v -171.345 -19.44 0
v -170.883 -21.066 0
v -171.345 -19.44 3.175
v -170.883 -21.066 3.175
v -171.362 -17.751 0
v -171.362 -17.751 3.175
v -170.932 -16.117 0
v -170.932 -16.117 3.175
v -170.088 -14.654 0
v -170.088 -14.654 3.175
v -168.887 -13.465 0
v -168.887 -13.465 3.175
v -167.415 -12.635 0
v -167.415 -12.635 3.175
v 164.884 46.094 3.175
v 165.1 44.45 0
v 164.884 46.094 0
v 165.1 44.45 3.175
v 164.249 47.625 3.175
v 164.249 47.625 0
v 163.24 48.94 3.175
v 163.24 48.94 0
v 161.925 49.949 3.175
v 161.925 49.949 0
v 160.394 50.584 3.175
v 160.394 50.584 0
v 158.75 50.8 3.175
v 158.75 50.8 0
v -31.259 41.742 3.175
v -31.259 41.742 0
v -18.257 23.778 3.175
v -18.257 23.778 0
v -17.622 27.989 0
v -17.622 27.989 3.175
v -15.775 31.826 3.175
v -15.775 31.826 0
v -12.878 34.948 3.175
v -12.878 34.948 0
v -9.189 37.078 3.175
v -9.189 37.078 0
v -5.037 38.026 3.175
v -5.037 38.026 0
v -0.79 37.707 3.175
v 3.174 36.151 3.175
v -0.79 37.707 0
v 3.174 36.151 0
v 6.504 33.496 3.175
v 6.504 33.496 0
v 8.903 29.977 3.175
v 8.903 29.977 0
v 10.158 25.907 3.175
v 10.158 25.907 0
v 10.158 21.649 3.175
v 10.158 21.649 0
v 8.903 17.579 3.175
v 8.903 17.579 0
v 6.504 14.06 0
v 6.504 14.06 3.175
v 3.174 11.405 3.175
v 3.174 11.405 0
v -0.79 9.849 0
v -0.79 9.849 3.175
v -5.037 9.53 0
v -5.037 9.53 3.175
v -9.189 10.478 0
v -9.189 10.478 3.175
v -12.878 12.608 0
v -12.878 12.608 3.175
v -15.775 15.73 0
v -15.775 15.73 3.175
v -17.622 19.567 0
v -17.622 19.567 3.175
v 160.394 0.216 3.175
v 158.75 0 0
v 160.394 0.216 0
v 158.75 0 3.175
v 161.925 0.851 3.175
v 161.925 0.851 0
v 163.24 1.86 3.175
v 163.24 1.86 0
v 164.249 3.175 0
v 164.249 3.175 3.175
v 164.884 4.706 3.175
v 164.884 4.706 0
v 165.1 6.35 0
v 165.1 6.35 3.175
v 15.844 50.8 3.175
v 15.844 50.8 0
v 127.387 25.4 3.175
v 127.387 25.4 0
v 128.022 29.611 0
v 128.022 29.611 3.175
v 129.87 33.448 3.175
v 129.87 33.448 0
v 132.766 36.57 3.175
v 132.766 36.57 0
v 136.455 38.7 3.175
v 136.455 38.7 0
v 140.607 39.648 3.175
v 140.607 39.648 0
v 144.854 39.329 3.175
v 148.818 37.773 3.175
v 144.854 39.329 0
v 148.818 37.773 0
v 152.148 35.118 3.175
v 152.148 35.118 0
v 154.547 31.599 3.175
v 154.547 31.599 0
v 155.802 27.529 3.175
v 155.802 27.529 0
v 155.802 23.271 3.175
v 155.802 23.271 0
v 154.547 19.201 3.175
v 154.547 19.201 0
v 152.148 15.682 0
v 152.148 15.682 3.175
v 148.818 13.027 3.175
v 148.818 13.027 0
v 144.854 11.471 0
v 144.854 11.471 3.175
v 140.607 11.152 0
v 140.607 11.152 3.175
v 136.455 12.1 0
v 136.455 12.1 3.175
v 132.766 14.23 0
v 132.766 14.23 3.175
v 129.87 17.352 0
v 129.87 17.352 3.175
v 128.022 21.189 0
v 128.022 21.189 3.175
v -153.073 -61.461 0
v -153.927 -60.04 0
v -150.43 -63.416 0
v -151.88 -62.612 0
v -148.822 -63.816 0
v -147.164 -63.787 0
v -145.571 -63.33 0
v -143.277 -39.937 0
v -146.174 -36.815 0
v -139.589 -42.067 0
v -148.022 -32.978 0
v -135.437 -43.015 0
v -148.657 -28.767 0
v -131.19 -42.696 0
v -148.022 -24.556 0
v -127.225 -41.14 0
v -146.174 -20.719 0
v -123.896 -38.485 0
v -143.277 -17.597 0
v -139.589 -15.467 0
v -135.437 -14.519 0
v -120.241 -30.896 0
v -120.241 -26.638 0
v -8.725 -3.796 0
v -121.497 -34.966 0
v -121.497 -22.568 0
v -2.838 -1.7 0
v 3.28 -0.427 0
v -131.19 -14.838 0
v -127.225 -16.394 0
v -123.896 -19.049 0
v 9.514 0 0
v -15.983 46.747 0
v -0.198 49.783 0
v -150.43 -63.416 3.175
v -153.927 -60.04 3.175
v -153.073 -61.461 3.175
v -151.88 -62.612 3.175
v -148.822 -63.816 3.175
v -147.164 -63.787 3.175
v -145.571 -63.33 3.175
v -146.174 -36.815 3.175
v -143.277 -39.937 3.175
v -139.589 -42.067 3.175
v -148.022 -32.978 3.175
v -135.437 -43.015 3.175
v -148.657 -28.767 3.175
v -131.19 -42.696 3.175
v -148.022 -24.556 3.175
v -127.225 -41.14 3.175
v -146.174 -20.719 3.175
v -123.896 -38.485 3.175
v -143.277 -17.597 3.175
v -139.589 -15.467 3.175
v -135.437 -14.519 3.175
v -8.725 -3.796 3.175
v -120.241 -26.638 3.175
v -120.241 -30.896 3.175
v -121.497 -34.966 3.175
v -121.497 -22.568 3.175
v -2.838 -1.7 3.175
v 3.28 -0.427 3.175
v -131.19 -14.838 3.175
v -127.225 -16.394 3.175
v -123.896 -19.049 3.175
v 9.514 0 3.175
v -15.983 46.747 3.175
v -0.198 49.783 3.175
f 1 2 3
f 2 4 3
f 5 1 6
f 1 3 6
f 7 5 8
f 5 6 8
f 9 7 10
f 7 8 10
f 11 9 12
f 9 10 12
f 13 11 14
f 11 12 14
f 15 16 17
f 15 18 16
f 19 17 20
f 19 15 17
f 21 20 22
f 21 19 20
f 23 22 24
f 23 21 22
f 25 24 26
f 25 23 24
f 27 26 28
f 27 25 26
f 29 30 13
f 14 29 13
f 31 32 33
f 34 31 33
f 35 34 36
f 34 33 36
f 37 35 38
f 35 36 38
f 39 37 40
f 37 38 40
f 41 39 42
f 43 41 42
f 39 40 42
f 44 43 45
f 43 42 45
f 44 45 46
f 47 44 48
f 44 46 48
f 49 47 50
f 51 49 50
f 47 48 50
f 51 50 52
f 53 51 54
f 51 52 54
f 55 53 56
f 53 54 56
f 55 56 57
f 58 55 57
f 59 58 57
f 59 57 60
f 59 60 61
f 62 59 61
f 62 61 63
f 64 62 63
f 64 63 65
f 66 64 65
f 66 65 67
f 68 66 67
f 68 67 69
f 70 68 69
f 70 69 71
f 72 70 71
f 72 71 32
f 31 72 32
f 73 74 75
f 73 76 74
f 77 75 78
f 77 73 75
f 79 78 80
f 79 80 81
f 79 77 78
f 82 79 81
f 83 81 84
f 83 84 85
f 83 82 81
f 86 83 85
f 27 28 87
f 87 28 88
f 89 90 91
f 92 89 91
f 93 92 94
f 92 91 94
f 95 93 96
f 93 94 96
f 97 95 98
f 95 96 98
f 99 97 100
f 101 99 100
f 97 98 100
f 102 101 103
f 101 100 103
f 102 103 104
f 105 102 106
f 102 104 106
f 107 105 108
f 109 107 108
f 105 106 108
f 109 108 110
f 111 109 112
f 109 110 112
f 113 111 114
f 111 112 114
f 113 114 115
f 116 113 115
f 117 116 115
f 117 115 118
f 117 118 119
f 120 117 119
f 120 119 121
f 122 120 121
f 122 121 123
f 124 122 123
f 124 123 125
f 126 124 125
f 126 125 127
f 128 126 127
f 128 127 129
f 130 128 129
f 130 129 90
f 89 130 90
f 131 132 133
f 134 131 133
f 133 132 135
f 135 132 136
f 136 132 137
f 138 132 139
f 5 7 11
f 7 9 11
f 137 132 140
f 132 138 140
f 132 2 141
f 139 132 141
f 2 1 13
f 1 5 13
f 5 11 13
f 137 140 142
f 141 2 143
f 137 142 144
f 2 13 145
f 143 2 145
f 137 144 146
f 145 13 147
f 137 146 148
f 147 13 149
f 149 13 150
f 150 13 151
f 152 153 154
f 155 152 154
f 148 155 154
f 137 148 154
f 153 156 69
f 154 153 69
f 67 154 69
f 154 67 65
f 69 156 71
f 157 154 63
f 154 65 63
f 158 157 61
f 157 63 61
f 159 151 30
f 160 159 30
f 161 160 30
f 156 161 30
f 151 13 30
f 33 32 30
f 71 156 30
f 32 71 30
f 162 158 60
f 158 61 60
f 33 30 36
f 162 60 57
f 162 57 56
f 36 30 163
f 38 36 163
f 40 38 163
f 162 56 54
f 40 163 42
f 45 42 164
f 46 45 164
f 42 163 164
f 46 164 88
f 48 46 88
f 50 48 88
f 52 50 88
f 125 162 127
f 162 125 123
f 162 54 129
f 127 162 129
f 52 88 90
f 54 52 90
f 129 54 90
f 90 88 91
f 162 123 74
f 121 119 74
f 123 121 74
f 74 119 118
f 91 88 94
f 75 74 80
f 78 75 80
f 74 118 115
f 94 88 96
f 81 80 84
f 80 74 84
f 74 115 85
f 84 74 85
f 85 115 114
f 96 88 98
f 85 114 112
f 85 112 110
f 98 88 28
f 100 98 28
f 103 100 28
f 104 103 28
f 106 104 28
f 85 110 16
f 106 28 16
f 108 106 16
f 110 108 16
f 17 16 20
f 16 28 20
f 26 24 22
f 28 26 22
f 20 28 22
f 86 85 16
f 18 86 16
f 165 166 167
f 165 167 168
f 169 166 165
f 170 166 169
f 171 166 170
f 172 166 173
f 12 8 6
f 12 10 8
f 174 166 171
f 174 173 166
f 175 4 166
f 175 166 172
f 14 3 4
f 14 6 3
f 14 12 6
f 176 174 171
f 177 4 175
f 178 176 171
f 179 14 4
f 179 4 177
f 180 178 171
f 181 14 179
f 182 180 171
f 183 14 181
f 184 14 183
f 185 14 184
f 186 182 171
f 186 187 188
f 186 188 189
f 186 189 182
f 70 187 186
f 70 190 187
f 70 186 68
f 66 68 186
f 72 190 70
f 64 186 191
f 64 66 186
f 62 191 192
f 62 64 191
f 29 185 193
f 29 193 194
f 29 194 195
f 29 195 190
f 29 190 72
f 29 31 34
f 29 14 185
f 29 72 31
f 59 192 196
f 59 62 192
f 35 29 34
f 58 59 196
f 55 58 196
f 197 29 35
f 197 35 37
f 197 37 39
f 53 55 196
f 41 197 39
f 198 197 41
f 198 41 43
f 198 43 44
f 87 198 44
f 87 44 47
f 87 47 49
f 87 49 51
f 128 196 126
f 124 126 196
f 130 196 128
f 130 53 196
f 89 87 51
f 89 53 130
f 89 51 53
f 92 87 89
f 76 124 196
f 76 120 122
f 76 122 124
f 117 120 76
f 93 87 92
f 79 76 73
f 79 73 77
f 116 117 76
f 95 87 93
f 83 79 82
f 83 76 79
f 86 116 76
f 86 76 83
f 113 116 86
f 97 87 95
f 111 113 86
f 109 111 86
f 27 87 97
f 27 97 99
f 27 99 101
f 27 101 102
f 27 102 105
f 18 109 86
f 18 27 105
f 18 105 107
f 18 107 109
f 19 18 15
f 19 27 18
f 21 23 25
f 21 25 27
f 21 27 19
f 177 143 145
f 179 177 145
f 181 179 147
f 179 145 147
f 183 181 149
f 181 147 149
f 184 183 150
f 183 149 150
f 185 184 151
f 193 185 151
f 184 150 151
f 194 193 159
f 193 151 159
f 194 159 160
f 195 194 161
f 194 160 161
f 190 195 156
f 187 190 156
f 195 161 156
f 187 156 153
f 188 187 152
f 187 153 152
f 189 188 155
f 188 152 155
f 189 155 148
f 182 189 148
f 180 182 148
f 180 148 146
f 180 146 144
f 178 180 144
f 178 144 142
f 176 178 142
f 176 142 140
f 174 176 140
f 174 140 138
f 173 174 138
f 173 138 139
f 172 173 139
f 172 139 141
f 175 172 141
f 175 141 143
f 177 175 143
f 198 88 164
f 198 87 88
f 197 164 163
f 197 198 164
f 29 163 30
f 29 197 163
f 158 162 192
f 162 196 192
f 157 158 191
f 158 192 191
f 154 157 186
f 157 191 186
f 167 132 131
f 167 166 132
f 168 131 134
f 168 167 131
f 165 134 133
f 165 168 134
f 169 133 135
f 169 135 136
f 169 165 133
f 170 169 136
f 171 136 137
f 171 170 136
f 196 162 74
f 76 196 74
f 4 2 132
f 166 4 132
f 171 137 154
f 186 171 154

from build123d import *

# Parameters (mm, degrees)
BOSS_EXTRUDE1_DEPTH = 3.175
FILLET1_R           = 45.72
FILLET4_R           = 127
FILLET5_R           = 6.35
FILLET6_R           = 6.35
FILLET7_R           = 6.35
FILLET8_R           = 6.35
SKETCH4_R           = 14.2875
CUT_EXTRUDE1_DEPTH  = 18.415


with BuildPart() as part:
    # Sketch1 → Boss-Extrude1 (new body)
    with BuildSketch(Plane.XY):
        Polygon((0, 0), (165.1, 0), (165.1, 50.8), (-8.578307929, 50.8), (-173.494021533, -15.063128689), (-151.393719418, -65.863128689), align=None)
    extrude(amount=BOSS_EXTRUDE1_DEPTH)

    # Fillet1
    fillet1_edges = [part.edges().sort_by_distance(p)[0] for p in [
        (0, 0, 1.5875),
    ]]
    fillet(fillet1_edges, radius=FILLET1_R)

    # Fillet4
    fillet4_edges = [part.edges().sort_by_distance(p)[0] for p in [
        (-8.578307929, 50.8, 1.5875),
    ]]
    fillet(fillet4_edges, radius=FILLET4_R)

    # Fillet5
    fillet5_edges = [part.edges().sort_by_distance(p)[0] for p in [
        (-151.393719418, -65.863128689, 1.5875),
    ]]
    fillet(fillet5_edges, radius=FILLET5_R)

    # Fillet6
    fillet6_edges = [part.edges().sort_by_distance(p)[0] for p in [
        (-173.494021533, -15.063128689, 1.5875),
    ]]
    fillet(fillet6_edges, radius=FILLET6_R)

    # Fillet7
    fillet7_edges = [part.edges().sort_by_distance(p)[0] for p in [
        (165.1, 0, 1.5875),
    ]]
    fillet(fillet7_edges, radius=FILLET7_R)

    # Fillet8
    fillet8_edges = [part.edges().sort_by_distance(p)[0] for p in [
        (165.1, 50.8, 1.5875),
    ]]
    fillet(fillet8_edges, radius=FILLET8_R)

    # Sketch4 → Cut-Extrude1 (cut)
    with BuildSketch(Plane(origin=(0, 0, 0), x_dir=(-1, 0, 0), z_dir=(0, 0, -1))):
        with Locations((-141.674387764, 25.4)):
            Circle(SKETCH4_R)
        with Locations((134.369201797, -28.767007742)):
            Circle(SKETCH4_R)
        with Locations((3.969661405, 23.777990081)):
            Circle(SKETCH4_R)
    extrude(amount=-CUT_EXTRUDE1_DEPTH, mode=Mode.SUBTRACT)


solid = part.part
